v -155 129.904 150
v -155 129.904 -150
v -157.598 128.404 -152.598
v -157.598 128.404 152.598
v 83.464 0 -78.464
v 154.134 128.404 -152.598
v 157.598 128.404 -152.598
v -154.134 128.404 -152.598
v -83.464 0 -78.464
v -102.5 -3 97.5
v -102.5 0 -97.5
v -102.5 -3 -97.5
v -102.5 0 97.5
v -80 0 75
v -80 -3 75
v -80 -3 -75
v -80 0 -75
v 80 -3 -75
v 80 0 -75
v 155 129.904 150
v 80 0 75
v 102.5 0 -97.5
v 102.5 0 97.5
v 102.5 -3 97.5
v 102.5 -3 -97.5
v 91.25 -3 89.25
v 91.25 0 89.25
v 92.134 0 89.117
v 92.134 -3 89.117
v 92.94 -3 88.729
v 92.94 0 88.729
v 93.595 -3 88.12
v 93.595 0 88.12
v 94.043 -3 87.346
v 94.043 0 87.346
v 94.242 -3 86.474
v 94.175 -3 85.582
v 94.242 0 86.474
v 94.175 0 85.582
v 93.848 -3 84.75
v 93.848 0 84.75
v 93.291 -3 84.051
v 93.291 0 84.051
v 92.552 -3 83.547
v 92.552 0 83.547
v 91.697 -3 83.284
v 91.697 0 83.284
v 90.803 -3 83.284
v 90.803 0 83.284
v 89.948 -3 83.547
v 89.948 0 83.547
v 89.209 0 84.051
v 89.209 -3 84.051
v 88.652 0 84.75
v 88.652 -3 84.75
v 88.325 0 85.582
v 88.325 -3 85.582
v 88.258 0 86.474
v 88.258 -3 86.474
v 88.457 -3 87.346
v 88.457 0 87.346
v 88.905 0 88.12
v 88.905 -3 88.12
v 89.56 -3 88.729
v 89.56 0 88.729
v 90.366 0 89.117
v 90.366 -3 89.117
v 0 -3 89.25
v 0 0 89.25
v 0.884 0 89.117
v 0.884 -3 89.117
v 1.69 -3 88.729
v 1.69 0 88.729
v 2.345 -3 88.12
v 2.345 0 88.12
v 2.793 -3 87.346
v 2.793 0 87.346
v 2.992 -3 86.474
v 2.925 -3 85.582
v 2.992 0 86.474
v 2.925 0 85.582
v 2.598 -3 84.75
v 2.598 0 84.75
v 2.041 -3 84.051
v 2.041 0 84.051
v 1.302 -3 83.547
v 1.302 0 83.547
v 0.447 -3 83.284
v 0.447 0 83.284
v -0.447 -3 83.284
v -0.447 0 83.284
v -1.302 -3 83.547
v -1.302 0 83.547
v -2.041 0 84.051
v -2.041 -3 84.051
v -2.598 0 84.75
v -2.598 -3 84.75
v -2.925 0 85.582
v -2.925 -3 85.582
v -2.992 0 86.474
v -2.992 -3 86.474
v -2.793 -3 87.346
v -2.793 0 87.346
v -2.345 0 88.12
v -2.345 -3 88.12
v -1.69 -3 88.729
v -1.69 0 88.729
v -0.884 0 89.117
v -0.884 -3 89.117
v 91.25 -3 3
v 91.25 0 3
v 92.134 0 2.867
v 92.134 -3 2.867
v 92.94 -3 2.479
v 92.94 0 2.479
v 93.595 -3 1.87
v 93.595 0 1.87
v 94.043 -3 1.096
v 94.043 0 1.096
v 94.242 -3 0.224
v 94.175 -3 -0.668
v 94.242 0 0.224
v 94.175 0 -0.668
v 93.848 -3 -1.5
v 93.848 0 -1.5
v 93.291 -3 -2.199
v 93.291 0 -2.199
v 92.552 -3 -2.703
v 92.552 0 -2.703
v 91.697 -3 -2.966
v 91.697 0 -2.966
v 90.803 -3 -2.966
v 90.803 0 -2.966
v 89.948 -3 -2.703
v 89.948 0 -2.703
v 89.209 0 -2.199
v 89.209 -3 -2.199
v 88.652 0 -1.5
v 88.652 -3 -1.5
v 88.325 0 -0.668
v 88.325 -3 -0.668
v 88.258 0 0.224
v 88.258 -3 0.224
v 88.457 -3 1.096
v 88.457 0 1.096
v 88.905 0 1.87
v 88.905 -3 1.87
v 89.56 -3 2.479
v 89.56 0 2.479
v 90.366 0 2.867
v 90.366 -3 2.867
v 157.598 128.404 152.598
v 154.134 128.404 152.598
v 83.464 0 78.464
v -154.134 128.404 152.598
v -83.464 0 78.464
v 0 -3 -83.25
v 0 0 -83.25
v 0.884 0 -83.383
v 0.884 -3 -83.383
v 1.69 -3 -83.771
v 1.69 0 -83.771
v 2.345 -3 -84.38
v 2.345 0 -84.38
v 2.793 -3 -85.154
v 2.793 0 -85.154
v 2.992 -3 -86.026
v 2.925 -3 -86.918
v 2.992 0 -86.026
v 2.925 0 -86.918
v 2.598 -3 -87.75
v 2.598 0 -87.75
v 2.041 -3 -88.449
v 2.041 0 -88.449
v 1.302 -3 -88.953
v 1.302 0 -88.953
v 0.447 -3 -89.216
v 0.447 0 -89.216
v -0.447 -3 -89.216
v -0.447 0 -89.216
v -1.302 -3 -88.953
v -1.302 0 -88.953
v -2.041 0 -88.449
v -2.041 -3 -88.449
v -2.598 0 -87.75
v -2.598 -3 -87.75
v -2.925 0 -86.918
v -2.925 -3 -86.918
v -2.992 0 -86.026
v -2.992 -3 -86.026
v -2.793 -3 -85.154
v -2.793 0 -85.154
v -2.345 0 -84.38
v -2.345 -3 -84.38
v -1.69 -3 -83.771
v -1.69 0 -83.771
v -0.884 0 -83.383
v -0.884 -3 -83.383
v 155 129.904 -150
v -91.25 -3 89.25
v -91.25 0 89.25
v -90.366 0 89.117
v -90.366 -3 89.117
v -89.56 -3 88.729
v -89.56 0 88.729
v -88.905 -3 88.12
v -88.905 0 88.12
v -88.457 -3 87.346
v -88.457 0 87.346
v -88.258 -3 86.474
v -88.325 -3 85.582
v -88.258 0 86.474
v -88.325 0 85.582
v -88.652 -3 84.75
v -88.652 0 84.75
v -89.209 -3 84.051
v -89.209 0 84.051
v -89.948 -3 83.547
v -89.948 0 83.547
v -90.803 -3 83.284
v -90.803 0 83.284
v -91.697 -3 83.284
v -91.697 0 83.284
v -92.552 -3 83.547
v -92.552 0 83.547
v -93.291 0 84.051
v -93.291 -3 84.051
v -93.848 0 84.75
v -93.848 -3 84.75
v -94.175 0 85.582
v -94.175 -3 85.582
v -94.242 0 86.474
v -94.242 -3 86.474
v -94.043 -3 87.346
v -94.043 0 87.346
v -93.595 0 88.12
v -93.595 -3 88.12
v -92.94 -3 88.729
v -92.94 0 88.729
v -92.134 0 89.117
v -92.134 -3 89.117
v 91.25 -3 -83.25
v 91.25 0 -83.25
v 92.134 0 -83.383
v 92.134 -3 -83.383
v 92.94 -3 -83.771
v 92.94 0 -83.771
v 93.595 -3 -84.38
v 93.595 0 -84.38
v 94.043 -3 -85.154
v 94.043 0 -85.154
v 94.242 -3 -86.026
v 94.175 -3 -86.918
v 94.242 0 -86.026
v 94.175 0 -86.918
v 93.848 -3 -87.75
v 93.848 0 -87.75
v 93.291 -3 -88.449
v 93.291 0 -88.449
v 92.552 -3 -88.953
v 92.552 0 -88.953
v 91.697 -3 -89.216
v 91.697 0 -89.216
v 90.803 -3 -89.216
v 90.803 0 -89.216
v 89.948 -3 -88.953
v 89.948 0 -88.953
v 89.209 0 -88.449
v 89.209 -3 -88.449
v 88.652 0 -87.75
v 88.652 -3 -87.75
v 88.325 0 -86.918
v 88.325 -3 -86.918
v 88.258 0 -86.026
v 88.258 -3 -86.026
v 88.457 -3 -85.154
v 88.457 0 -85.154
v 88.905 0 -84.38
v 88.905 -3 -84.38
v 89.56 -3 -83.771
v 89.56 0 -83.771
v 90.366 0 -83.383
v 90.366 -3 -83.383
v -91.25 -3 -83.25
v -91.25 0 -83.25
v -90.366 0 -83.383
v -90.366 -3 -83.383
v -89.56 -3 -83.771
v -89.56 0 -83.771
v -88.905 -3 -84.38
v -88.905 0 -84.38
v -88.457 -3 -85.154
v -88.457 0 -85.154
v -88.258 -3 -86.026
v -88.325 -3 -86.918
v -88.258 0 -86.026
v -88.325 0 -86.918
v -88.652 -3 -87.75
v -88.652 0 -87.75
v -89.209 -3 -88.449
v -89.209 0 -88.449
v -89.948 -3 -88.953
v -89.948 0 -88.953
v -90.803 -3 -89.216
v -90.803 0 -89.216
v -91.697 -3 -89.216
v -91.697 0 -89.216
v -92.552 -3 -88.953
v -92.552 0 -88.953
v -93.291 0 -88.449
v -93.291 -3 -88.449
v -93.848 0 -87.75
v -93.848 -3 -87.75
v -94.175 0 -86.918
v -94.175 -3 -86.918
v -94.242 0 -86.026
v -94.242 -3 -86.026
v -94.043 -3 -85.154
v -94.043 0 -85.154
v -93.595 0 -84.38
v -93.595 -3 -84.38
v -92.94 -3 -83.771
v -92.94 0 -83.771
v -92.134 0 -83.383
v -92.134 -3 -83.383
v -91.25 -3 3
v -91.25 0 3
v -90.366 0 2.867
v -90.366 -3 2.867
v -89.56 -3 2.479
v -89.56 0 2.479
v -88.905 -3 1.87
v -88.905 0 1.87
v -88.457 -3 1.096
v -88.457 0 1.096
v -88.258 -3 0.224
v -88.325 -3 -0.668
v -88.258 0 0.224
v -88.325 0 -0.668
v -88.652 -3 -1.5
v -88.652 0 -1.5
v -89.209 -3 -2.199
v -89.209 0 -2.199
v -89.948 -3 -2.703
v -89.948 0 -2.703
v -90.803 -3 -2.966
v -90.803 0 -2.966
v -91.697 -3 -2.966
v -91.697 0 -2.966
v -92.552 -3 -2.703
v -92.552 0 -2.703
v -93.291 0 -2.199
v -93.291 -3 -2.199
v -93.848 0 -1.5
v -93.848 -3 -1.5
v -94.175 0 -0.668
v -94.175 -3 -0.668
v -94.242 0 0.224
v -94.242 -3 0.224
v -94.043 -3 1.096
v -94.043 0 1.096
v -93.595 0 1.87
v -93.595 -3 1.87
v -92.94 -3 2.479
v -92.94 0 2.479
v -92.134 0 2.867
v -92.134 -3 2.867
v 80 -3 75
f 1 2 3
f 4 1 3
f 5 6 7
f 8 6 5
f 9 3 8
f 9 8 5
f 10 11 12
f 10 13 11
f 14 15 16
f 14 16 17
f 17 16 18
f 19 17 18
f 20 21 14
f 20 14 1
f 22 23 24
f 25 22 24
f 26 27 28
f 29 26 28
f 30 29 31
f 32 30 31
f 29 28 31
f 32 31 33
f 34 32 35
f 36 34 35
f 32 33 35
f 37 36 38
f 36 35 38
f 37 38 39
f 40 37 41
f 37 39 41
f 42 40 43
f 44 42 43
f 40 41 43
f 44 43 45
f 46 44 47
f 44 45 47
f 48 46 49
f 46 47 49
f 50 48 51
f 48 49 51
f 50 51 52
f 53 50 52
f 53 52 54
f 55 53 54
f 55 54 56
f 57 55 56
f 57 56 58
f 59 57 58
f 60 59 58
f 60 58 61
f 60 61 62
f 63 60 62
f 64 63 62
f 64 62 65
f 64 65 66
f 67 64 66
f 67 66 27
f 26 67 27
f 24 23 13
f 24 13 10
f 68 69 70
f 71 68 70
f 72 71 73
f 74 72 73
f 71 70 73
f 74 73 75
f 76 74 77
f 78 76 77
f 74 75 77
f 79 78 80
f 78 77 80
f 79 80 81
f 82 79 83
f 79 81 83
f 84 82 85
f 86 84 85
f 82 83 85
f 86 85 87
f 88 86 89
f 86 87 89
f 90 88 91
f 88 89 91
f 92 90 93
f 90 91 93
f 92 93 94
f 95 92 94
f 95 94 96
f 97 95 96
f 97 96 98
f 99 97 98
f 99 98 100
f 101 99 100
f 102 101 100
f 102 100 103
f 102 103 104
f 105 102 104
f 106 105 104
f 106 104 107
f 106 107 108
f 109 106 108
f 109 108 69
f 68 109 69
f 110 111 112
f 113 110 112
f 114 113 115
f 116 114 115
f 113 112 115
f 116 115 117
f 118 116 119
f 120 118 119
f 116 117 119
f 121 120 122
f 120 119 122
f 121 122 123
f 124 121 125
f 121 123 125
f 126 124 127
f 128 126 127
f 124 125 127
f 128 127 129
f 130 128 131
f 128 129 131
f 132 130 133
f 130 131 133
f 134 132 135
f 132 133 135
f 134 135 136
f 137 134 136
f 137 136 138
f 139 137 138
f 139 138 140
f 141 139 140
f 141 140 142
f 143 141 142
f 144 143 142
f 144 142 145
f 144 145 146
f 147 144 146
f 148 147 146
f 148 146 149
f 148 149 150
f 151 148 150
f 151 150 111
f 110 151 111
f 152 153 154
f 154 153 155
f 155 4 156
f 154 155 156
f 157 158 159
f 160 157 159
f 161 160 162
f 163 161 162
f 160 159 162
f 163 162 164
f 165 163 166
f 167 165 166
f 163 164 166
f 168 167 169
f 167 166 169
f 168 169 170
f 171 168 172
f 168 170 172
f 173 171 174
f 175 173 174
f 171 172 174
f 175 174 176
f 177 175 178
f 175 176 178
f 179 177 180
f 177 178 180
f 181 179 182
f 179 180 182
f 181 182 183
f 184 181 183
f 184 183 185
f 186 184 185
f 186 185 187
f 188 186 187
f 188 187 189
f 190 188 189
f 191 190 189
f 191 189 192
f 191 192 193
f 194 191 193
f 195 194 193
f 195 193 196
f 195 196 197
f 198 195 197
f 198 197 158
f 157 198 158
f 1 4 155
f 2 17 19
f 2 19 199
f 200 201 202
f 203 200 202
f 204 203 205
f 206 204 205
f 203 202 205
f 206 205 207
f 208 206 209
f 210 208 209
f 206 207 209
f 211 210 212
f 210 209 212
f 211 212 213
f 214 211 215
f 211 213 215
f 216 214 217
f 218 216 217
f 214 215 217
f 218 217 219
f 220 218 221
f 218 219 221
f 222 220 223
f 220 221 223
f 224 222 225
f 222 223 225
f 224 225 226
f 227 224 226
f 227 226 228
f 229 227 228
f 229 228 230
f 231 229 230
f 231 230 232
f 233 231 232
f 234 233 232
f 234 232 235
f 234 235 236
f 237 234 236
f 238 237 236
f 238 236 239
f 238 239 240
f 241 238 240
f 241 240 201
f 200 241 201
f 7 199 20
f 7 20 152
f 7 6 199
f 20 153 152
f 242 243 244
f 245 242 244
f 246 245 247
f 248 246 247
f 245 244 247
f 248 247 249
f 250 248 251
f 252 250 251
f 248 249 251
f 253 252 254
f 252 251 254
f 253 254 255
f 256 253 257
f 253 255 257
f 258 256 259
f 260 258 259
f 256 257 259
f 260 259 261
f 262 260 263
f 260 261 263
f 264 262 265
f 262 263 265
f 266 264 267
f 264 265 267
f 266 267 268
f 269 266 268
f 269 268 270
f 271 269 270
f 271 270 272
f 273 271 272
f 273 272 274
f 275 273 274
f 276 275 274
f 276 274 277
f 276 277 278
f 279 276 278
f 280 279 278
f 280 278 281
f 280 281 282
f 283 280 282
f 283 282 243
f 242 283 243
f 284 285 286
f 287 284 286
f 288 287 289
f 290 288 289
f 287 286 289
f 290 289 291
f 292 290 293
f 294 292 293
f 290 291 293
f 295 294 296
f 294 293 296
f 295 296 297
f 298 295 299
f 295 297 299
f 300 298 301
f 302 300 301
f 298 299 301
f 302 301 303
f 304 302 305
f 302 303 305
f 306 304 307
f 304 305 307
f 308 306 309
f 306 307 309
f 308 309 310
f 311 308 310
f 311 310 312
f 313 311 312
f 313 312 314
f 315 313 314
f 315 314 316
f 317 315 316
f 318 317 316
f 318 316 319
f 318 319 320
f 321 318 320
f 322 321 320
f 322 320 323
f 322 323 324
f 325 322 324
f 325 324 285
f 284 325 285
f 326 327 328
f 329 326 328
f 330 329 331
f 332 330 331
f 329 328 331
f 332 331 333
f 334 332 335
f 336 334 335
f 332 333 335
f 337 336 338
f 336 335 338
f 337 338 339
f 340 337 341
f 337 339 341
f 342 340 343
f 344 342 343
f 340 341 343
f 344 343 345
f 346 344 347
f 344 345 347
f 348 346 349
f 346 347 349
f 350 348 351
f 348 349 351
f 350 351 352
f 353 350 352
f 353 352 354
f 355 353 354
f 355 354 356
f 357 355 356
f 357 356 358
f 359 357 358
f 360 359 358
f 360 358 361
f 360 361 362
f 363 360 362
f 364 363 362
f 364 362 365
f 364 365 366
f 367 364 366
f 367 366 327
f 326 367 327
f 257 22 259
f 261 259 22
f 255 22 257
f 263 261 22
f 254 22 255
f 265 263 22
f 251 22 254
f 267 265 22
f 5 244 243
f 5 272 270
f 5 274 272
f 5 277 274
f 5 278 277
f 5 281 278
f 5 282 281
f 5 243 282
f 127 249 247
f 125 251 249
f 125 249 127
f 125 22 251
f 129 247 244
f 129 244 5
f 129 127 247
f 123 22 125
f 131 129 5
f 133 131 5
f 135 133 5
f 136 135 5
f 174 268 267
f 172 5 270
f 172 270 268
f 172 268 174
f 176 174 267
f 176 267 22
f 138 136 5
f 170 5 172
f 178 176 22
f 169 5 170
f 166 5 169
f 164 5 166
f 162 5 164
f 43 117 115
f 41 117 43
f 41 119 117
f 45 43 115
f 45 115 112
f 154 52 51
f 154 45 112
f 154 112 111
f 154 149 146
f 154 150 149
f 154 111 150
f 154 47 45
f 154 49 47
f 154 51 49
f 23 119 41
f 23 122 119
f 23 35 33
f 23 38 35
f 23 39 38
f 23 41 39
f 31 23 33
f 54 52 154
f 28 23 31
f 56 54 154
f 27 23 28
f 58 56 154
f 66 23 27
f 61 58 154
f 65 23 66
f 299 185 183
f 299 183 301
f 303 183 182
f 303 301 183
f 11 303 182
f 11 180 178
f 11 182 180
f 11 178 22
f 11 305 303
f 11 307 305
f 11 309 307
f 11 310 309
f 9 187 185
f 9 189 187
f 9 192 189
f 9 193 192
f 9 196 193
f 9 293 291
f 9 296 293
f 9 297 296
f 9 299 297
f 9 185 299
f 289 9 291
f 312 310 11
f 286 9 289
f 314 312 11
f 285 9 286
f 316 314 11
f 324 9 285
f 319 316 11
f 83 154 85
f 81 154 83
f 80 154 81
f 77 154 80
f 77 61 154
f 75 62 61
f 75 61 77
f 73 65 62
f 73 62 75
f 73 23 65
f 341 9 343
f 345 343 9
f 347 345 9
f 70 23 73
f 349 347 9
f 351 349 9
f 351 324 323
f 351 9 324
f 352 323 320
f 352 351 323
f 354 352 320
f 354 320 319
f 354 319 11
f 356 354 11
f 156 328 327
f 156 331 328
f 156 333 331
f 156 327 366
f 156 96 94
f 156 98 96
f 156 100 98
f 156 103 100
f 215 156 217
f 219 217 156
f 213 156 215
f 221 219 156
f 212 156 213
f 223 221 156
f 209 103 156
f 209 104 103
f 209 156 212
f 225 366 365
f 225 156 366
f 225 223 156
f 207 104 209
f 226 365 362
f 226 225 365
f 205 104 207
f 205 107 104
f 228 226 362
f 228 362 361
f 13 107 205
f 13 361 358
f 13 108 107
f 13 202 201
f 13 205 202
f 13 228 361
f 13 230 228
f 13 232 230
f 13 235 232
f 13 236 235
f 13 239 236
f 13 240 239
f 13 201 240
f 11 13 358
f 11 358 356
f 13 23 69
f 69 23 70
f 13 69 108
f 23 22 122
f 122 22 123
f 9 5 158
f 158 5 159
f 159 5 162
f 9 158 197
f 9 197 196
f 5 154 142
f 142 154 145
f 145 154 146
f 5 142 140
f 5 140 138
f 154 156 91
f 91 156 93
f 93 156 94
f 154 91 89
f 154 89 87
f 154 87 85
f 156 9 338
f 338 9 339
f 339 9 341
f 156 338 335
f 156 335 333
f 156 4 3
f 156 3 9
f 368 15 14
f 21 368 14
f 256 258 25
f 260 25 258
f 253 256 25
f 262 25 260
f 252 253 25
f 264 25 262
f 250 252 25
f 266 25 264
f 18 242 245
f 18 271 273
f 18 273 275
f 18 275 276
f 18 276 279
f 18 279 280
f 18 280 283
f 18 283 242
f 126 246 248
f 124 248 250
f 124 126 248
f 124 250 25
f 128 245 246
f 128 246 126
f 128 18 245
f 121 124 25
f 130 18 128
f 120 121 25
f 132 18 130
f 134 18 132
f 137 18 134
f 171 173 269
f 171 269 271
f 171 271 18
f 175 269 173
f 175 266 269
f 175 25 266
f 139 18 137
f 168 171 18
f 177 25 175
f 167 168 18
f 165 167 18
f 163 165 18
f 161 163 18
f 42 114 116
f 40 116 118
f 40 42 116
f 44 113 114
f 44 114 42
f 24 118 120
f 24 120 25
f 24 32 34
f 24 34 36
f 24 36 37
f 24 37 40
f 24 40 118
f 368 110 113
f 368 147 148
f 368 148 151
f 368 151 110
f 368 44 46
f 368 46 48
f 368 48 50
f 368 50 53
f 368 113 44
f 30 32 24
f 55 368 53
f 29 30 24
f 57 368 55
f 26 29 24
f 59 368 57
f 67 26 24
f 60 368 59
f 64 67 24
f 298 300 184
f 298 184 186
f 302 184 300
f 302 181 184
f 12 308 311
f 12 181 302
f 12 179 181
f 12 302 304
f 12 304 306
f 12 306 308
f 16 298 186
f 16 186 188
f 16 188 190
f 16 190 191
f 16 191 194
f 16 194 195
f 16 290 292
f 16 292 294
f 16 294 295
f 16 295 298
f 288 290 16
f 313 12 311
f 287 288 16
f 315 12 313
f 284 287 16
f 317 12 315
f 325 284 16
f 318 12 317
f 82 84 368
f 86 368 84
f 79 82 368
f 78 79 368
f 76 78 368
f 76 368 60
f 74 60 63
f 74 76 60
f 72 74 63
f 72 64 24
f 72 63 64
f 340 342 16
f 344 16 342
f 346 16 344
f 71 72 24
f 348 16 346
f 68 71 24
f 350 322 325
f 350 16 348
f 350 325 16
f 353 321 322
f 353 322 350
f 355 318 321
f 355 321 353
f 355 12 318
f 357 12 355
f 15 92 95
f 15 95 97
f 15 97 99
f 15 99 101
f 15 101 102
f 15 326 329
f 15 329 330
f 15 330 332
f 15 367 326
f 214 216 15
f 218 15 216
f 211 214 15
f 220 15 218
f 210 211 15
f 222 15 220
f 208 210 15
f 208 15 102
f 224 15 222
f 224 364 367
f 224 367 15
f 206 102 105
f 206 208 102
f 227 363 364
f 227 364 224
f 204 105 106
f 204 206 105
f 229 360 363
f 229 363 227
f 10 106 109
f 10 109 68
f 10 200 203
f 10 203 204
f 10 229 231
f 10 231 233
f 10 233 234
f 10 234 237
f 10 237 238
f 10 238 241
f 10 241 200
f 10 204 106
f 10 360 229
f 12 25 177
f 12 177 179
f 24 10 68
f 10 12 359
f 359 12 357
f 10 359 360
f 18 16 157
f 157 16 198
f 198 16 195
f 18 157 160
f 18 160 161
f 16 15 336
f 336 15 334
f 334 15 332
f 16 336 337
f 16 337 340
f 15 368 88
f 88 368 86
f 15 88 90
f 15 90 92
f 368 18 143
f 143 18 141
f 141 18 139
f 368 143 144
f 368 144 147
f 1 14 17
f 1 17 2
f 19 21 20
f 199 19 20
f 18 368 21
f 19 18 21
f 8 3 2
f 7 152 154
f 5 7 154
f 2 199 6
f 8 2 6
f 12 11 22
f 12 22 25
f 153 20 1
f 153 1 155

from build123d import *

# Parameters (mm, degrees)
BOSS_EXTRUDE1_DEPTH   = 200
BOSS_EXTRUDE2_START   = -155
BOSS_EXTRUDE2_DEPTH   = 310
BOSS_EXTRUDE2_START_2 = 75
BOSS_EXTRUDE2_2_DEPTH = 77.598076211
CUT_EXTRUDE1_DEPTH    = 286.853377845
SKETCH4_W             = 315.196152422
SKETCH4_H             = 3
CUT_EXTRUDE2_DEPTH    = 373.124552005
SKETCH5_W             = 205
SKETCH5_H             = 22.5
BOSS_EXTRUDE3_DEPTH   = 3
SKETCH6_R             = 3
CUT_EXTRUDE3_DEPTH    = 255.947693633


with BuildPart() as part:
    # Sketch1 → Boss-Extrude1 (new, symmetric)
    with BuildSketch(Plane.XY):
        Polygon((-102.5, 0), (-102.5, -3), (-80, -3), (-80, 0), (-155, 129.903810568), (-157.598076211, 128.403810568), (-83.464101615, 0), align=None)
    extrude(amount=BOSS_EXTRUDE1_DEPTH, both=True)


with BuildPart() as body_2:
    # Mirror3: mirrored copy
    add(part.part.mirror(Plane(origin=(0, 0, 0), x_dir=(0, 0, 1), z_dir=(1, 0, 0))))


with BuildPart() as body_3:
    # Boss-Extrude2: read off the stored shape, not the designer's step
    # Boss-Extrude2 outline → Boss-Extrude2 (new body)
    with BuildSketch(Plane(origin=(0, 0, 0), x_dir=(0, 0, -1), z_dir=(1, 0, 0)).offset(BOSS_EXTRUDE2_START)):
        Polygon((-150, 129.903810568), (-152.598076211, 128.403810568), (-78.464101615, 0), (-97.5, 0), (-97.5, -3), (-75, -3), (-75, 0), align=None)
    extrude(amount=BOSS_EXTRUDE2_DEPTH)

    # Boss-Extrude2 2 outline → Boss-Extrude2 2 (cut)
    with BuildSketch(Plane.XY.offset(BOSS_EXTRUDE2_START_2)):
        Polygon((155, 129.903810568), (78.267949192, -3), (155, -3), align=None)
        Polygon((-155, 129.903810568), (-155, -3), (-78.267949192, -3), align=None)
    extrude(amount=BOSS_EXTRUDE2_2_DEPTH, mode=Mode.SUBTRACT)


with BuildPart() as body_4:
    # Mirror5: mirrored copy
    add(body_3.part.mirror(Plane.XY))


with BuildPart() as cut_extrude1_tool:
    # Sketch3 → Cut-Extrude1 (new, symmetric)
    with BuildSketch(Plane(origin=(0, 0, 0), x_dir=(0, 0, -1), z_dir=(1, 0, 0))):
        Polygon((-152.598076211, 128.403810568), (-78.464101615, 0), (-97.5, 0), (-97.5, -3), (-200, -3), (-200, 129.903810568), (-153.464101615, 129.903810568), align=None)
    cut_extrude1 = extrude(amount=CUT_EXTRUDE1_DEPTH, both=True)


with BuildPart() as part_1:
    add(part.part)

    # Cut-Extrude1: cut by cut_extrude1_tool
    add(cut_extrude1_tool.part, mode=Mode.SUBTRACT)


with BuildPart() as body_2_1:
    add(body_2.part)

    # Cut-Extrude1: cut by cut_extrude1_tool
    add(cut_extrude1_tool.part, mode=Mode.SUBTRACT)


with BuildPart() as cut_extrude2_tool:
    # Sketch4 → Cut-Extrude2 (new, through all)
    with BuildSketch(Plane(origin=(0, 162.37976321, 93.75), x_dir=(1, 0, 0), z_dir=(0, 0.8660254037844436, 0.4999999999999916))):
        with Locations((0, -66.451905284)):
            Rectangle(SKETCH4_W, SKETCH4_H)
    cut_extrude2 = extrude(amount=CUT_EXTRUDE2_DEPTH)


with BuildPart() as part_2:
    add(part_1.part)

    # Cut-Extrude2: cut by cut_extrude2_tool
    add(cut_extrude2_tool.part, mode=Mode.SUBTRACT)



with BuildPart() as body_2_2:
    add(body_2_1.part)

    # Cut-Extrude2: cut by cut_extrude2_tool
    add(cut_extrude2_tool.part, mode=Mode.SUBTRACT)


with BuildPart() as part_3:
    add(part_2.part)

    add(body_2_2.part)  # Boss-Extrude3 merges body 2

    add(body_3.part)  # Boss-Extrude3 merges body 3
    # Sketch5 → Boss-Extrude3 (add)
    with BuildSketch(Plane.XZ.offset(3)):
        with Locations((0, 86.25)):
            Rectangle(SKETCH5_W, SKETCH5_H)
    boss_extrude3 = extrude(amount=-BOSS_EXTRUDE3_DEPTH)

    # Mirror9: Cut-Extrude1, Cut-Extrude2 across plane
    add(cut_extrude1.mirror(Plane.XY), mode=Mode.SUBTRACT)
    add(cut_extrude2.mirror(Plane.XY), mode=Mode.SUBTRACT)

    # Mirror9 2: Boss-Extrude3 across plane
    add(boss_extrude3.mirror(Plane.XY))

    # Combine5: union body 4
    add(body_4.part)

    # Sketch6 → Cut-Extrude3 (cut, through all)
    with BuildSketch(Plane(origin=(0, 0, 0), x_dir=(1, 0, 0), z_dir=(0, 1, 0))):
        with Locations(Location((-91.25, 86.25, 0), (0, 0, 270))):
            Circle(SKETCH6_R)
        with Locations(Location((0, 86.25, 0), (0, 0, 270))):
            Circle(SKETCH6_R)
        with Locations(Location((91.25, 86.25, 0), (0, 0, 270))):
            Circle(SKETCH6_R)
        with Locations(Location((-91.25, 0, 0), (0, 0, 270))):
            Circle(SKETCH6_R)
        with Locations(Location((91.25, 0, 0), (0, 0, 270))):
            Circle(SKETCH6_R)
        with Locations(Location((91.25, -86.25, 0), (0, 0, 270))):
            Circle(SKETCH6_R)
        with Locations(Location((0, -86.25, 0), (0, 0, 270))):
            Circle(SKETCH6_R)
        with Locations(Location((-91.25, -86.25, 0), (0, 0, 270))):
            Circle(SKETCH6_R)
    extrude(amount=-CUT_EXTRUDE3_DEPTH, mode=Mode.SUBTRACT)


solid = part_3.part
